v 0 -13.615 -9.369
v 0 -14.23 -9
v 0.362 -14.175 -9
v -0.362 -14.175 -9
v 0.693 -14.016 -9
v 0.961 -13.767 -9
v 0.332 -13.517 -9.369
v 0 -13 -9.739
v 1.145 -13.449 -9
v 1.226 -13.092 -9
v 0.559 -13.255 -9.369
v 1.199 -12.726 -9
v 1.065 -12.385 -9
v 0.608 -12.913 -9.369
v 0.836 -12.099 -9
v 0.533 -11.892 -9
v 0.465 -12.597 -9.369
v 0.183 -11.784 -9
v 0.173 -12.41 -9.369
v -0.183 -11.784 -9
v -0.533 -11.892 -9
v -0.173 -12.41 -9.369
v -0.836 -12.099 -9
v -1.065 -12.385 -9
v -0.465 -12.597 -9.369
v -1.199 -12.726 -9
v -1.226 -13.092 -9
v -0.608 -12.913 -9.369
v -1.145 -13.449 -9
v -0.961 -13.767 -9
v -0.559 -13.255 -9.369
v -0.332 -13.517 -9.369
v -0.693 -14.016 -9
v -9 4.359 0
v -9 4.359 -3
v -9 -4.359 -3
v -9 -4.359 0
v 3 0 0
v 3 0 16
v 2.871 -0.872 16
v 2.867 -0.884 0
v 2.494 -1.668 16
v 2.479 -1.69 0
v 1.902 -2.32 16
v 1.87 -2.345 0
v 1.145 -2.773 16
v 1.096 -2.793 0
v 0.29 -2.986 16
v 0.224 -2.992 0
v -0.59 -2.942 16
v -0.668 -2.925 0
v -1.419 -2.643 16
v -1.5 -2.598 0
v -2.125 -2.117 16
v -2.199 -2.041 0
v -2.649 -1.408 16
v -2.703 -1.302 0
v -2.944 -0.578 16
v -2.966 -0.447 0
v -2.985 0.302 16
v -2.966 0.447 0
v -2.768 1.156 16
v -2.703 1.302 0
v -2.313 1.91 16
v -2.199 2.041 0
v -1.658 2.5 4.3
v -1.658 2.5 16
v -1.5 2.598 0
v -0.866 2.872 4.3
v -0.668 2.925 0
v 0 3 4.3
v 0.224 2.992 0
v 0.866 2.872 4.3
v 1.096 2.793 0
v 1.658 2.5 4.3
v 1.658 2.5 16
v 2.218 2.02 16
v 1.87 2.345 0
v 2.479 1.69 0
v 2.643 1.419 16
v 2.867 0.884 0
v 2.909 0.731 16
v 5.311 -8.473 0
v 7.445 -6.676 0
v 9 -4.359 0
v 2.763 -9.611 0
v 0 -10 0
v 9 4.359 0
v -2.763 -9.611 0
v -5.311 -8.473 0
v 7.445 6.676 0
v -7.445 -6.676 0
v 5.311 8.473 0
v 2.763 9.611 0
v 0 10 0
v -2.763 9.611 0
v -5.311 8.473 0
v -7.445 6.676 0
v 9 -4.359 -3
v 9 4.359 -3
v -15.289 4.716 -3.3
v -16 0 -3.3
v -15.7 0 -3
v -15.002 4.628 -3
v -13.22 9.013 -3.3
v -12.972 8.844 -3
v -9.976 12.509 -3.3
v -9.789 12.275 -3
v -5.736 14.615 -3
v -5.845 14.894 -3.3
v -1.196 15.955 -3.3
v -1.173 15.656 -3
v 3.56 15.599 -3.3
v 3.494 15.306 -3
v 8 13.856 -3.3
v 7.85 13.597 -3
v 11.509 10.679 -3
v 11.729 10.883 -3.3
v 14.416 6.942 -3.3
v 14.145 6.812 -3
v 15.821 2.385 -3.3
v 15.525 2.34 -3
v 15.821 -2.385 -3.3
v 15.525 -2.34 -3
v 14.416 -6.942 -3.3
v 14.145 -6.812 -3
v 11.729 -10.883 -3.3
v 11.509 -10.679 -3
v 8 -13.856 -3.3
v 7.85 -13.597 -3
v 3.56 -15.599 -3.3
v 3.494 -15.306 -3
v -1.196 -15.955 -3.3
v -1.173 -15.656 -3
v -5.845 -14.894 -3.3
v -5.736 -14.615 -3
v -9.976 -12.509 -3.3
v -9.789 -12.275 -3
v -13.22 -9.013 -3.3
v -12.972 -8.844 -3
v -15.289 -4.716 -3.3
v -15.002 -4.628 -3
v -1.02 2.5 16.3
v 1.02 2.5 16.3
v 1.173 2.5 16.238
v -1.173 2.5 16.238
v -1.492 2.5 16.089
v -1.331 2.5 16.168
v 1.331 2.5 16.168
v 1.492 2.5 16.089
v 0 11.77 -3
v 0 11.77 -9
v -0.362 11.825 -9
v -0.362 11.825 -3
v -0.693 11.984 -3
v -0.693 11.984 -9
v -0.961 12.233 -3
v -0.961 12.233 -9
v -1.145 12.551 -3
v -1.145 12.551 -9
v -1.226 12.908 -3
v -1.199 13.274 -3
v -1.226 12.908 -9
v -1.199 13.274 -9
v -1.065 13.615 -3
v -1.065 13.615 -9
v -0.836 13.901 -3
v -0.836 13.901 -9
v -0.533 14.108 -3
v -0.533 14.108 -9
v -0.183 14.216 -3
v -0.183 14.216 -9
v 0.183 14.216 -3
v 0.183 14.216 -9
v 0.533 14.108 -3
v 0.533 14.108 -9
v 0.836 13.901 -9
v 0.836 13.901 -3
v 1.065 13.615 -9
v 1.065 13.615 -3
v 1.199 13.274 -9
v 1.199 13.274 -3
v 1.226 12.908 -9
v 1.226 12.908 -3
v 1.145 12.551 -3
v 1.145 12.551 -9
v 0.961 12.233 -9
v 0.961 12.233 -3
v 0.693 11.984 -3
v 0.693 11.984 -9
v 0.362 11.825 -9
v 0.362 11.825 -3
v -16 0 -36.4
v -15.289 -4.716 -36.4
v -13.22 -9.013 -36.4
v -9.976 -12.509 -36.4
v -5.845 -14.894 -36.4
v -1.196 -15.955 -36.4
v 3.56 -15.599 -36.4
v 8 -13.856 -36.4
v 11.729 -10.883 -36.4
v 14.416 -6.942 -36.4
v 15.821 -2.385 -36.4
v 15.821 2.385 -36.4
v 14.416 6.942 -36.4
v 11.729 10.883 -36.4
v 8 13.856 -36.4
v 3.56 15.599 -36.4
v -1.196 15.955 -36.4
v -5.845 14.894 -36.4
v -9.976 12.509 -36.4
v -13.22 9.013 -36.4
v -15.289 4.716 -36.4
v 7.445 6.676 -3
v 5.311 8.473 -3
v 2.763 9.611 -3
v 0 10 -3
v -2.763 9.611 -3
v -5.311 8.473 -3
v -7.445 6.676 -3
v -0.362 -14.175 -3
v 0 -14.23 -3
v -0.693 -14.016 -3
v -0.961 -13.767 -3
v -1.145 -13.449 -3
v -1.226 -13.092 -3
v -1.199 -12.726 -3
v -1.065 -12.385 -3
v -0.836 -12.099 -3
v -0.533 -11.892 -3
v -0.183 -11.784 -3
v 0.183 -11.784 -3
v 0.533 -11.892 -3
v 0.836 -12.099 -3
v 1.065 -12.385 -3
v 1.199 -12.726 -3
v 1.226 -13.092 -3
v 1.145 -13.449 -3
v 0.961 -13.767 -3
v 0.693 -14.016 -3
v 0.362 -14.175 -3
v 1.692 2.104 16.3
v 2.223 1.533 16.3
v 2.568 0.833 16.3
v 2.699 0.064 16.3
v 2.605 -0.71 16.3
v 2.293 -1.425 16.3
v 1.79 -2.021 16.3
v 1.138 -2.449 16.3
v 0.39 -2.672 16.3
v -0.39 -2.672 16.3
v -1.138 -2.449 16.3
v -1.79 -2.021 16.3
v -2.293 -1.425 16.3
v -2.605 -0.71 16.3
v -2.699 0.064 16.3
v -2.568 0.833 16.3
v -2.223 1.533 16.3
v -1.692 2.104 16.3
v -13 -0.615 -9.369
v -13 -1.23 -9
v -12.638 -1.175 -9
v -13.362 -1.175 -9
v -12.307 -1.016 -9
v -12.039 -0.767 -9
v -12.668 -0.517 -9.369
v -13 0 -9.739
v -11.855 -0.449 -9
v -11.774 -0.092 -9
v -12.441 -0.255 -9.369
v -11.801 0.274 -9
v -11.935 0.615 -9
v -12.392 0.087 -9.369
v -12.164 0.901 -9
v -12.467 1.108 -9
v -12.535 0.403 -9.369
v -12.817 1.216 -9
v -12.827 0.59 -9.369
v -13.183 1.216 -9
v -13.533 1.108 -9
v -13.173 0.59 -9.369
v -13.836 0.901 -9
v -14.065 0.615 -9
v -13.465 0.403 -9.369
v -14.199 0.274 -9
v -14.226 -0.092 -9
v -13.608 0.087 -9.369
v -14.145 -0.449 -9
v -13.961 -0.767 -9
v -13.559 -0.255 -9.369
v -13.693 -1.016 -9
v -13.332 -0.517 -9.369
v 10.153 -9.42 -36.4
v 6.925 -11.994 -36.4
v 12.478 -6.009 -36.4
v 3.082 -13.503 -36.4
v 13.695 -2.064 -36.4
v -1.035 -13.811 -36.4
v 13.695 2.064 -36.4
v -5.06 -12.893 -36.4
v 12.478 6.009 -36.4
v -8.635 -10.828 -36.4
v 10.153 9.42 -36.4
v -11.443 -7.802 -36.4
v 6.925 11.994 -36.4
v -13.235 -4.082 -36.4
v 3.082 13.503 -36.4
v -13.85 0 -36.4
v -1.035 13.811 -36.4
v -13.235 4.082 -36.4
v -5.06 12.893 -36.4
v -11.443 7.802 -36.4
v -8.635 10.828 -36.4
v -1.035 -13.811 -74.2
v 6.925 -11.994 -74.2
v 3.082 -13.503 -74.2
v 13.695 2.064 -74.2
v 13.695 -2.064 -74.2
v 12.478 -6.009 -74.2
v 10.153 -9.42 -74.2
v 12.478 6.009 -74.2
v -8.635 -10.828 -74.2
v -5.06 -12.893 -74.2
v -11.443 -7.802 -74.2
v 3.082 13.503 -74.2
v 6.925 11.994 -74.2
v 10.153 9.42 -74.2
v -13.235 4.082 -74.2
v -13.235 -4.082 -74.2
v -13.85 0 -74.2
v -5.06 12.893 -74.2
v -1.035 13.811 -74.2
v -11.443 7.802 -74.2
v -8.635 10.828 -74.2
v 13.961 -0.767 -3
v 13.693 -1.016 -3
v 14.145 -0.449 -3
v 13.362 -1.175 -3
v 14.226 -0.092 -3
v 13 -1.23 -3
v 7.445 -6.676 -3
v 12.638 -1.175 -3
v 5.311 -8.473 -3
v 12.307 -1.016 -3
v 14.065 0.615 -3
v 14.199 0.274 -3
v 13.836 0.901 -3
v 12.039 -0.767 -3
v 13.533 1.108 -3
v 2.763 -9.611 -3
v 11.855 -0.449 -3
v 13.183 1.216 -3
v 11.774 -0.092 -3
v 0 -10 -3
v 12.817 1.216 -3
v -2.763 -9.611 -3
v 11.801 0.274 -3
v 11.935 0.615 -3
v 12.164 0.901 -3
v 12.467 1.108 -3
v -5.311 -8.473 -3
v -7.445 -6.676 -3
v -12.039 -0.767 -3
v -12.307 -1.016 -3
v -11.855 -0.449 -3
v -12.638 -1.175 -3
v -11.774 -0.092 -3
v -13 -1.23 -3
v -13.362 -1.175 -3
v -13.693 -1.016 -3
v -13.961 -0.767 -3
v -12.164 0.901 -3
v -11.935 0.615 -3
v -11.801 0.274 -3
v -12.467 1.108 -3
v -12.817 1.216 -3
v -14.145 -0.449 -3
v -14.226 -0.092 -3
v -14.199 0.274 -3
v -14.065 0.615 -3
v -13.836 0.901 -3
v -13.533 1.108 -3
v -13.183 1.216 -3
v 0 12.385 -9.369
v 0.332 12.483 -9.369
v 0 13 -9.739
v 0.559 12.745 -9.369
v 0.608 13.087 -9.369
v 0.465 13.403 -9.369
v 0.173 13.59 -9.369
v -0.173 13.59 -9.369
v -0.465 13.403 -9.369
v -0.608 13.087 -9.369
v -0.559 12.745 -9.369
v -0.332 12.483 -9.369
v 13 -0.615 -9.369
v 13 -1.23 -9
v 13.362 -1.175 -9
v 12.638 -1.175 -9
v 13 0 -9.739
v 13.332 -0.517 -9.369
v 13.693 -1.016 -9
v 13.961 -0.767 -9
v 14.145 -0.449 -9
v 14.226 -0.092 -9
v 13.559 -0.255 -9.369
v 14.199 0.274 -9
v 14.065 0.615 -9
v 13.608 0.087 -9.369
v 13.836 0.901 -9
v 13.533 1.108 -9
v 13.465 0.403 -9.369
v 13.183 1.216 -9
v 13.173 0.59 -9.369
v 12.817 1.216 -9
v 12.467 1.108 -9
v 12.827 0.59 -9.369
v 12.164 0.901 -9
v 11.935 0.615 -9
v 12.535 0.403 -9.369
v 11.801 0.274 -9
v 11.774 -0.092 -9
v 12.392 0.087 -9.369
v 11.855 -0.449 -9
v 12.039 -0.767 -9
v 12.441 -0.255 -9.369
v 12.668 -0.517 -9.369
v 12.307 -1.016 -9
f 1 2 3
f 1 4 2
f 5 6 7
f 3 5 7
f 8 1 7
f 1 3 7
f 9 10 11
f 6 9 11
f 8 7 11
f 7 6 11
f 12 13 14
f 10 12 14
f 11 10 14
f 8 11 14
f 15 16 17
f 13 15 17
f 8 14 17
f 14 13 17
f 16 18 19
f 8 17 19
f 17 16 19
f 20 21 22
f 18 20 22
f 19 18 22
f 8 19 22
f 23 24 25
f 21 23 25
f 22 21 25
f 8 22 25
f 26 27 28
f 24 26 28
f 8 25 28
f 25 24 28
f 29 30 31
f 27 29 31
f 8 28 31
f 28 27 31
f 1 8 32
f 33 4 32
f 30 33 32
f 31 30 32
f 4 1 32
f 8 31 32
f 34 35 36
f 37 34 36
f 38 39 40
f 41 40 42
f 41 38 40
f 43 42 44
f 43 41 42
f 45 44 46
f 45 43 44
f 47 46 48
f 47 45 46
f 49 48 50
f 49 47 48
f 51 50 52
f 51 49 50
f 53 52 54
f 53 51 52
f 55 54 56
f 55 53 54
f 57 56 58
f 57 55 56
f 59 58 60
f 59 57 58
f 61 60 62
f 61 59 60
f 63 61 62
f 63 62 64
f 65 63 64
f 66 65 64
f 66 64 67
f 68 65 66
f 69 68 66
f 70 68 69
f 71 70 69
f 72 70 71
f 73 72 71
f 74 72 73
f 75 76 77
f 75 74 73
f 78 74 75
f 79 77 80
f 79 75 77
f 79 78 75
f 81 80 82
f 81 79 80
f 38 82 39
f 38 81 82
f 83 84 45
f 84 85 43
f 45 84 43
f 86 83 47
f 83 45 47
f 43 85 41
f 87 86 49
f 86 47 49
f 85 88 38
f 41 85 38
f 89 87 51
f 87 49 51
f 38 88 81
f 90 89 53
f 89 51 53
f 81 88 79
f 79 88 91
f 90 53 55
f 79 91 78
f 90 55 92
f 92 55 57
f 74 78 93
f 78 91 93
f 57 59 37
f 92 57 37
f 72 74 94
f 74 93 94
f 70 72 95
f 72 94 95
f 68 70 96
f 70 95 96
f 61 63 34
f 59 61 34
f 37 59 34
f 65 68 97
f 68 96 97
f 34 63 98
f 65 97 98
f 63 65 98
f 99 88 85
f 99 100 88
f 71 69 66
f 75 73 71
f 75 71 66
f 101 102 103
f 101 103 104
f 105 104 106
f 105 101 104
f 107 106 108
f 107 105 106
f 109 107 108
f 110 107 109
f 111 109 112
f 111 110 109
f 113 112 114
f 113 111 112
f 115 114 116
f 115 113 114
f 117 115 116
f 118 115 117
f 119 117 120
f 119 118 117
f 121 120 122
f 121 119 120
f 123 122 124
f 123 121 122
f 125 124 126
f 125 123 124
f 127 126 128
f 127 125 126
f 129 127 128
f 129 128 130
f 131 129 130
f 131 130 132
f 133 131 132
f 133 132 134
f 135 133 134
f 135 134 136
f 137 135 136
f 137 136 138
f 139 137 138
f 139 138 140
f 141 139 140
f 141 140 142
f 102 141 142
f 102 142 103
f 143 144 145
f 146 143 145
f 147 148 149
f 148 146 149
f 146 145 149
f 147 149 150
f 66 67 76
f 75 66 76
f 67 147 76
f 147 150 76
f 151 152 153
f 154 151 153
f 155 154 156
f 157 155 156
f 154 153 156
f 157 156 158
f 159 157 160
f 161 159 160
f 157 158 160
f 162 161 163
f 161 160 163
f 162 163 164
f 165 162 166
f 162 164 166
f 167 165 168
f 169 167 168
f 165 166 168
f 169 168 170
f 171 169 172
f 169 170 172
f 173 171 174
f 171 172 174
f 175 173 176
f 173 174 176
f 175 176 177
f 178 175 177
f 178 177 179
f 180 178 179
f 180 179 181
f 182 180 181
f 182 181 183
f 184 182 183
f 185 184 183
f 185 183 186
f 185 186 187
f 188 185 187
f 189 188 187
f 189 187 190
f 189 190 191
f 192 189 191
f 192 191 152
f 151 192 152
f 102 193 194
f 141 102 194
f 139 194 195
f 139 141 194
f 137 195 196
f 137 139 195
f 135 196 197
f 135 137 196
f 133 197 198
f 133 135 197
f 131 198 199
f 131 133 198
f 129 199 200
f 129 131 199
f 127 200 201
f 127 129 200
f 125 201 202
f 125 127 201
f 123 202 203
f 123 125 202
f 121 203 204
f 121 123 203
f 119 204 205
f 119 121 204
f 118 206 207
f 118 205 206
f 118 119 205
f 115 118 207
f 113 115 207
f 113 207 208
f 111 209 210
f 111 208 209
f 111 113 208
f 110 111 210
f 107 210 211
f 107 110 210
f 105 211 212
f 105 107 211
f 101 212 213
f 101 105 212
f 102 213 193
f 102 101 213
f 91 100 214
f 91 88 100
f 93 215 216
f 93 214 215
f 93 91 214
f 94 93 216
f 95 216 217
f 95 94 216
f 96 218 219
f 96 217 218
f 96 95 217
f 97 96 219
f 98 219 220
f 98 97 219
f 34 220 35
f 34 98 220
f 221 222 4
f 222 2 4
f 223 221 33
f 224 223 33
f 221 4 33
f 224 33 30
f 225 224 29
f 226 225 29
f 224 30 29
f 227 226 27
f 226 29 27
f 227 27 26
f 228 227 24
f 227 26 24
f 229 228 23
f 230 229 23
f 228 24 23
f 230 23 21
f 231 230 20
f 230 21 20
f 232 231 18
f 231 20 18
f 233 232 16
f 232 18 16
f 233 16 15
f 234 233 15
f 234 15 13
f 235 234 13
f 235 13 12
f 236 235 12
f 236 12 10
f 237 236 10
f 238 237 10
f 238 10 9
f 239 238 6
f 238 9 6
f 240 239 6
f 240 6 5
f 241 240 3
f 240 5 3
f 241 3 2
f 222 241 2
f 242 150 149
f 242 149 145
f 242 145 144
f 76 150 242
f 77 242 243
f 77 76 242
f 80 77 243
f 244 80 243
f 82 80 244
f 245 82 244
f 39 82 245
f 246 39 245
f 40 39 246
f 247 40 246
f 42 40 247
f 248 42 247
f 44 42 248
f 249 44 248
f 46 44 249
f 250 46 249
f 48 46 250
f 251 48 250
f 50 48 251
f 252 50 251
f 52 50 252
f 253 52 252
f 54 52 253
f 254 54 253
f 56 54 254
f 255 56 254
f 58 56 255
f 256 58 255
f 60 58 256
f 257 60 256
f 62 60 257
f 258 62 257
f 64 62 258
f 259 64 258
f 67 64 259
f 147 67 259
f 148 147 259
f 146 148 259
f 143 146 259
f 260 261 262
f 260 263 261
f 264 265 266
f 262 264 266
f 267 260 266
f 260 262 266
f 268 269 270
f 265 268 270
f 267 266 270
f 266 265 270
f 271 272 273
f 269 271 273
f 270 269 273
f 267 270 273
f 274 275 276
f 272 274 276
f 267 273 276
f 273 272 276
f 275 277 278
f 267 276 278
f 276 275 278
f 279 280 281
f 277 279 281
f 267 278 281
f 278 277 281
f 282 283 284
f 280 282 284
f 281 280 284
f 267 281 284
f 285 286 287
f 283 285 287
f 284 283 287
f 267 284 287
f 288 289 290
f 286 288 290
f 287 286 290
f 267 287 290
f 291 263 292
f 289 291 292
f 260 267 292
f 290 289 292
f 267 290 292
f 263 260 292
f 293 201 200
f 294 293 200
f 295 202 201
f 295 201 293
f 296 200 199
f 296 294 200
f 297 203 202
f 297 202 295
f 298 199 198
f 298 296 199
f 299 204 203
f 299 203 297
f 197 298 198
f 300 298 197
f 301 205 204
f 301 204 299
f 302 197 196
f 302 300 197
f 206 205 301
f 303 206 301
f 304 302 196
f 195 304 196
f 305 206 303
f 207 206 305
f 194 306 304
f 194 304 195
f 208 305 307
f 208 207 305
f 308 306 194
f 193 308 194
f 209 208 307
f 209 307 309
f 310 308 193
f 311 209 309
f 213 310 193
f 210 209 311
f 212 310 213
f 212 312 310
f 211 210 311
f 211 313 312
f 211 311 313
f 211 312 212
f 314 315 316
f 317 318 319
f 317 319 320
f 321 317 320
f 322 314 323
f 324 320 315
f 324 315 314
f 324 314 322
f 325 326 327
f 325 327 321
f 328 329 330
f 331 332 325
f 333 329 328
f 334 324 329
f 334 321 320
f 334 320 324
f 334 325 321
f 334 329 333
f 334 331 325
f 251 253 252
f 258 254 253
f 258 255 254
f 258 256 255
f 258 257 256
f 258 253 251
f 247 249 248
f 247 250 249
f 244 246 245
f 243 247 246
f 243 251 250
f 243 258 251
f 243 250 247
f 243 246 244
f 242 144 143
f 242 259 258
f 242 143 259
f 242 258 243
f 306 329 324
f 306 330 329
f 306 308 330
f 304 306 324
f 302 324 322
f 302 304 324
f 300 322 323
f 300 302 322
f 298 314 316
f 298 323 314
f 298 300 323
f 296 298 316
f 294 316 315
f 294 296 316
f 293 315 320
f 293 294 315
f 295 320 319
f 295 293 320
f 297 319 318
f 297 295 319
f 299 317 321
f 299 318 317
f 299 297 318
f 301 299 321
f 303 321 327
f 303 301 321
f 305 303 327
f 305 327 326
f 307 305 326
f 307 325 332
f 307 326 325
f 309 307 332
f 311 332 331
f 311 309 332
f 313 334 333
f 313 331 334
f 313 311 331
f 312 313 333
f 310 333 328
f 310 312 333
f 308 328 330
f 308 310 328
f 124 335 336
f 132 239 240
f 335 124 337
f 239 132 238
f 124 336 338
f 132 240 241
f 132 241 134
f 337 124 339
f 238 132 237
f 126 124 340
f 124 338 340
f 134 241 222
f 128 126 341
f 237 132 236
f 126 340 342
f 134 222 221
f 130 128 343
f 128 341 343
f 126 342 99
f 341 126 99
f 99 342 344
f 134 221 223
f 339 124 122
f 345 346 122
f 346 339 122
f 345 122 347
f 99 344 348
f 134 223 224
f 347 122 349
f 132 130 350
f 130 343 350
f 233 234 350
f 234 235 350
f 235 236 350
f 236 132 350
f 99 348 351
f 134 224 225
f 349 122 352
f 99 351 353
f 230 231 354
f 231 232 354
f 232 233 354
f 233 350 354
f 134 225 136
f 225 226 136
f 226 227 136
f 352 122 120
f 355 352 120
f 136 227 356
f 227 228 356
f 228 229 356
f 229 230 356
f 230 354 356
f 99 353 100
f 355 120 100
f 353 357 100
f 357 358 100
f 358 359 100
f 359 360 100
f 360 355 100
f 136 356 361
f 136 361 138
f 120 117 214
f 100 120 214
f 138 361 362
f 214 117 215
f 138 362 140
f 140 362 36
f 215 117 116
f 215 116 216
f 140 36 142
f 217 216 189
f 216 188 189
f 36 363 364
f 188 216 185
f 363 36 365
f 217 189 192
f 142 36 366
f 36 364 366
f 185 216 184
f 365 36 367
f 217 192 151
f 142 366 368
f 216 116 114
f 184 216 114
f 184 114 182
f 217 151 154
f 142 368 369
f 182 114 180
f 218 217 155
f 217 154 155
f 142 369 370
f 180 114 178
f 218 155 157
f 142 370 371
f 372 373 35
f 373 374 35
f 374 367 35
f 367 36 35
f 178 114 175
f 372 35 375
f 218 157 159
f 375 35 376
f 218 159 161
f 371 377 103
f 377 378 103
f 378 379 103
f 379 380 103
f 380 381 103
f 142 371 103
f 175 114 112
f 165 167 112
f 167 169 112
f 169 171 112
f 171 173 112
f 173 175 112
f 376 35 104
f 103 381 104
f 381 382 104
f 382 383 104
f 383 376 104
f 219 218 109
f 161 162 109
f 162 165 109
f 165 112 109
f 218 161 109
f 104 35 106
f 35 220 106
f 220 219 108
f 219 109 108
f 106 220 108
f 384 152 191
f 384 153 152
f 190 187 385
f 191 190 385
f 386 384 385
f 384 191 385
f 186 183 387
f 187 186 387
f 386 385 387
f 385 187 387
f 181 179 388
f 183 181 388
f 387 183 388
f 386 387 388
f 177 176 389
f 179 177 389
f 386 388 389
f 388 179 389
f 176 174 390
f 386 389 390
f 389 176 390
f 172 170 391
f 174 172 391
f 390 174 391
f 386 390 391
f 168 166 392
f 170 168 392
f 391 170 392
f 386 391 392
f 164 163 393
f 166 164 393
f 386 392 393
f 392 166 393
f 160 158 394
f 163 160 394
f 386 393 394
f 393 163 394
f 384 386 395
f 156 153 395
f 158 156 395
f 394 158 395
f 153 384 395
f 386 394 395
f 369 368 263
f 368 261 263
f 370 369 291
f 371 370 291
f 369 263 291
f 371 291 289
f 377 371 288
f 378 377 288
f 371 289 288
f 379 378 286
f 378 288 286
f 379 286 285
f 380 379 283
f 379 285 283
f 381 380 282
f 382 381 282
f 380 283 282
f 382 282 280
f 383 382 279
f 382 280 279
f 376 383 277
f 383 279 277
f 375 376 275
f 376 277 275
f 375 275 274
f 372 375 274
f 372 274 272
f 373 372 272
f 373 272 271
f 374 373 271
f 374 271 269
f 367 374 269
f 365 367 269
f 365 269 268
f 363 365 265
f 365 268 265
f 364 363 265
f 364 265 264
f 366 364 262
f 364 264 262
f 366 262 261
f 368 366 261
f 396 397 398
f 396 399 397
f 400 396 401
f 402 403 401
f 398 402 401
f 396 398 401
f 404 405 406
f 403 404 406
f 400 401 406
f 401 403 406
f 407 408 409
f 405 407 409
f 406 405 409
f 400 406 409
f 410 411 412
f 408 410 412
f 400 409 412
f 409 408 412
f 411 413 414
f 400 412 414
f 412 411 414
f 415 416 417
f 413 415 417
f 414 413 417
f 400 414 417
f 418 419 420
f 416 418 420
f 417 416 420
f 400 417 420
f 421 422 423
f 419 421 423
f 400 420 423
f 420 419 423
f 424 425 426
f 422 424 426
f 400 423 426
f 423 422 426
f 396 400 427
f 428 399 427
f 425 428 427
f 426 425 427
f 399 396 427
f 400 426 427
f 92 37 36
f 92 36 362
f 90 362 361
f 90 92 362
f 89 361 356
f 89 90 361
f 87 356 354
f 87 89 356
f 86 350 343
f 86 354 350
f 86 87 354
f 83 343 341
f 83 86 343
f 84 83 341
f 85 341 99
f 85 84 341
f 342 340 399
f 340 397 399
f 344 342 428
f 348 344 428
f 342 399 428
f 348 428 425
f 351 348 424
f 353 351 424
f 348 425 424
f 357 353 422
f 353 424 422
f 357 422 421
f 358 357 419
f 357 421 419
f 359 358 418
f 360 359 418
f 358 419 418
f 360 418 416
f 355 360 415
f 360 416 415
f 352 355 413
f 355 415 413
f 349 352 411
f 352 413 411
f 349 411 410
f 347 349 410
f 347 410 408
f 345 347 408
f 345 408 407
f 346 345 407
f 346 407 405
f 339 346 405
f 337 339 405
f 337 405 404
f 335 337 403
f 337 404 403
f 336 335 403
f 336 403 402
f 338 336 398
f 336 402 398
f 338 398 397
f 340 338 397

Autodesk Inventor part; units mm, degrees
ref_plane "YZ Plane" through (0, 0, 0) normal (1, 0, 0) x (0, 1, 0)
ref_plane "XZ Plane" through (0, 0, 0) normal (0, 1, 0) x (-1, 0, 0)
ref_plane "XY Plane" through (0, 0, 0) normal (0, 0, 1) x (1, 0, 0)
sketch "スケッチ1" plane through (0, 0, 0) normal (0, 0, 1) x (1, 0, 0)
  circle A0 centre (0, 0) radius 3
  dimension "d0" = 6
extrude "押し出し1" add sketch "スケッチ1" along normal blind 16.3
sketch "スケッチ2" plane through (0, 0, 16.3) normal (0, 0, 1) x (1, 0, 0)
  circle A0 centre (0, 0) radius 3 projected
  line L0 (-1.6583, 2.5) -> (1.6583, 2.5)
  dimension "d3" = 5.5
extrude "押し出し2" cut sketch "スケッチ2" against normal blind 12 contours L0 A0 picked at (-0.1169, 2.6598)
chamfer "面取り1" distance 0.3 angle 45 2 edges at (-1.4186, -2.6434, 16.3) (2.6434, 1.4186, 16.3)
sketch "スケッチ3" plane through (0, 0, 0) normal (0, 0, -1) x (-1, 0, 0)
  circle A0 centre (0, 0) radius 10
  dimension "d9" = 20
extrude "押し出し3" add sketch "スケッチ3" along normal blind 3
sketch "スケッチ4" plane through (0, 0, -3) normal (0, 0, -1) x (-1, 0, 0)
  circle A0 centre (0, 0) radius 10 projected
  line L0 (9, 4.3589) -> (9, -4.3589)
  line L1 (-9, 4.3589) -> (-9, -4.3589)
  dimension "d12" = 18
extrude "押し出し4" cut sketch "スケッチ4" against normal blind 3 contours A0 L0 | L1 A0
sketch "スケッチ5" plane through (0, 0, -3) normal (0, 0, -1) x (-1, 0, 0)
  circle A0 centre (0, 0) radius 16
  dimension "d15" = 32
extrude "押し出し5" add sketch "スケッチ5" along normal blind 33.4
chamfer "面取り2" distance 0.3 angle 45 1 edges at (16, 0, -3)
sketch "スケッチ6" plane through (0, 0, -3) normal (0, 0, 1) x (1, 0, 0)
  arc A0 (9, 4.3589) -> (-9, 4.3589) centre (0, 0) ccw projected
  point P0 (0, 13)
  point P1 (-13, 0)
  point P2 (0, -13)
  point P3 (13, 0)
  dimension "d21" = 13
  dimension "d24" = 360
hole "穴1" at (0, 13, -3) at (-13, 0, -3) at (0, -13, -3) at (13, 0, -3) direction (0, 0, -1) diameter 2.459 depth 6 tip angle 118 thread size "M3x0.5" class "6H" standard "ANSI Metric M Profile"
sketch "スケッチ7" plane through (0, 0, -36.4) normal (0, 0, -1) x (-1, 0, 0)
  circle A0 centre (0, 0) radius 13.85
  dimension "d33" = 27.7
extrude "押し出し6" add sketch "スケッチ7" along normal blind 37.8
properties part number "RS385PH_Geared_Motor" material "鋼、鍛鋼"
